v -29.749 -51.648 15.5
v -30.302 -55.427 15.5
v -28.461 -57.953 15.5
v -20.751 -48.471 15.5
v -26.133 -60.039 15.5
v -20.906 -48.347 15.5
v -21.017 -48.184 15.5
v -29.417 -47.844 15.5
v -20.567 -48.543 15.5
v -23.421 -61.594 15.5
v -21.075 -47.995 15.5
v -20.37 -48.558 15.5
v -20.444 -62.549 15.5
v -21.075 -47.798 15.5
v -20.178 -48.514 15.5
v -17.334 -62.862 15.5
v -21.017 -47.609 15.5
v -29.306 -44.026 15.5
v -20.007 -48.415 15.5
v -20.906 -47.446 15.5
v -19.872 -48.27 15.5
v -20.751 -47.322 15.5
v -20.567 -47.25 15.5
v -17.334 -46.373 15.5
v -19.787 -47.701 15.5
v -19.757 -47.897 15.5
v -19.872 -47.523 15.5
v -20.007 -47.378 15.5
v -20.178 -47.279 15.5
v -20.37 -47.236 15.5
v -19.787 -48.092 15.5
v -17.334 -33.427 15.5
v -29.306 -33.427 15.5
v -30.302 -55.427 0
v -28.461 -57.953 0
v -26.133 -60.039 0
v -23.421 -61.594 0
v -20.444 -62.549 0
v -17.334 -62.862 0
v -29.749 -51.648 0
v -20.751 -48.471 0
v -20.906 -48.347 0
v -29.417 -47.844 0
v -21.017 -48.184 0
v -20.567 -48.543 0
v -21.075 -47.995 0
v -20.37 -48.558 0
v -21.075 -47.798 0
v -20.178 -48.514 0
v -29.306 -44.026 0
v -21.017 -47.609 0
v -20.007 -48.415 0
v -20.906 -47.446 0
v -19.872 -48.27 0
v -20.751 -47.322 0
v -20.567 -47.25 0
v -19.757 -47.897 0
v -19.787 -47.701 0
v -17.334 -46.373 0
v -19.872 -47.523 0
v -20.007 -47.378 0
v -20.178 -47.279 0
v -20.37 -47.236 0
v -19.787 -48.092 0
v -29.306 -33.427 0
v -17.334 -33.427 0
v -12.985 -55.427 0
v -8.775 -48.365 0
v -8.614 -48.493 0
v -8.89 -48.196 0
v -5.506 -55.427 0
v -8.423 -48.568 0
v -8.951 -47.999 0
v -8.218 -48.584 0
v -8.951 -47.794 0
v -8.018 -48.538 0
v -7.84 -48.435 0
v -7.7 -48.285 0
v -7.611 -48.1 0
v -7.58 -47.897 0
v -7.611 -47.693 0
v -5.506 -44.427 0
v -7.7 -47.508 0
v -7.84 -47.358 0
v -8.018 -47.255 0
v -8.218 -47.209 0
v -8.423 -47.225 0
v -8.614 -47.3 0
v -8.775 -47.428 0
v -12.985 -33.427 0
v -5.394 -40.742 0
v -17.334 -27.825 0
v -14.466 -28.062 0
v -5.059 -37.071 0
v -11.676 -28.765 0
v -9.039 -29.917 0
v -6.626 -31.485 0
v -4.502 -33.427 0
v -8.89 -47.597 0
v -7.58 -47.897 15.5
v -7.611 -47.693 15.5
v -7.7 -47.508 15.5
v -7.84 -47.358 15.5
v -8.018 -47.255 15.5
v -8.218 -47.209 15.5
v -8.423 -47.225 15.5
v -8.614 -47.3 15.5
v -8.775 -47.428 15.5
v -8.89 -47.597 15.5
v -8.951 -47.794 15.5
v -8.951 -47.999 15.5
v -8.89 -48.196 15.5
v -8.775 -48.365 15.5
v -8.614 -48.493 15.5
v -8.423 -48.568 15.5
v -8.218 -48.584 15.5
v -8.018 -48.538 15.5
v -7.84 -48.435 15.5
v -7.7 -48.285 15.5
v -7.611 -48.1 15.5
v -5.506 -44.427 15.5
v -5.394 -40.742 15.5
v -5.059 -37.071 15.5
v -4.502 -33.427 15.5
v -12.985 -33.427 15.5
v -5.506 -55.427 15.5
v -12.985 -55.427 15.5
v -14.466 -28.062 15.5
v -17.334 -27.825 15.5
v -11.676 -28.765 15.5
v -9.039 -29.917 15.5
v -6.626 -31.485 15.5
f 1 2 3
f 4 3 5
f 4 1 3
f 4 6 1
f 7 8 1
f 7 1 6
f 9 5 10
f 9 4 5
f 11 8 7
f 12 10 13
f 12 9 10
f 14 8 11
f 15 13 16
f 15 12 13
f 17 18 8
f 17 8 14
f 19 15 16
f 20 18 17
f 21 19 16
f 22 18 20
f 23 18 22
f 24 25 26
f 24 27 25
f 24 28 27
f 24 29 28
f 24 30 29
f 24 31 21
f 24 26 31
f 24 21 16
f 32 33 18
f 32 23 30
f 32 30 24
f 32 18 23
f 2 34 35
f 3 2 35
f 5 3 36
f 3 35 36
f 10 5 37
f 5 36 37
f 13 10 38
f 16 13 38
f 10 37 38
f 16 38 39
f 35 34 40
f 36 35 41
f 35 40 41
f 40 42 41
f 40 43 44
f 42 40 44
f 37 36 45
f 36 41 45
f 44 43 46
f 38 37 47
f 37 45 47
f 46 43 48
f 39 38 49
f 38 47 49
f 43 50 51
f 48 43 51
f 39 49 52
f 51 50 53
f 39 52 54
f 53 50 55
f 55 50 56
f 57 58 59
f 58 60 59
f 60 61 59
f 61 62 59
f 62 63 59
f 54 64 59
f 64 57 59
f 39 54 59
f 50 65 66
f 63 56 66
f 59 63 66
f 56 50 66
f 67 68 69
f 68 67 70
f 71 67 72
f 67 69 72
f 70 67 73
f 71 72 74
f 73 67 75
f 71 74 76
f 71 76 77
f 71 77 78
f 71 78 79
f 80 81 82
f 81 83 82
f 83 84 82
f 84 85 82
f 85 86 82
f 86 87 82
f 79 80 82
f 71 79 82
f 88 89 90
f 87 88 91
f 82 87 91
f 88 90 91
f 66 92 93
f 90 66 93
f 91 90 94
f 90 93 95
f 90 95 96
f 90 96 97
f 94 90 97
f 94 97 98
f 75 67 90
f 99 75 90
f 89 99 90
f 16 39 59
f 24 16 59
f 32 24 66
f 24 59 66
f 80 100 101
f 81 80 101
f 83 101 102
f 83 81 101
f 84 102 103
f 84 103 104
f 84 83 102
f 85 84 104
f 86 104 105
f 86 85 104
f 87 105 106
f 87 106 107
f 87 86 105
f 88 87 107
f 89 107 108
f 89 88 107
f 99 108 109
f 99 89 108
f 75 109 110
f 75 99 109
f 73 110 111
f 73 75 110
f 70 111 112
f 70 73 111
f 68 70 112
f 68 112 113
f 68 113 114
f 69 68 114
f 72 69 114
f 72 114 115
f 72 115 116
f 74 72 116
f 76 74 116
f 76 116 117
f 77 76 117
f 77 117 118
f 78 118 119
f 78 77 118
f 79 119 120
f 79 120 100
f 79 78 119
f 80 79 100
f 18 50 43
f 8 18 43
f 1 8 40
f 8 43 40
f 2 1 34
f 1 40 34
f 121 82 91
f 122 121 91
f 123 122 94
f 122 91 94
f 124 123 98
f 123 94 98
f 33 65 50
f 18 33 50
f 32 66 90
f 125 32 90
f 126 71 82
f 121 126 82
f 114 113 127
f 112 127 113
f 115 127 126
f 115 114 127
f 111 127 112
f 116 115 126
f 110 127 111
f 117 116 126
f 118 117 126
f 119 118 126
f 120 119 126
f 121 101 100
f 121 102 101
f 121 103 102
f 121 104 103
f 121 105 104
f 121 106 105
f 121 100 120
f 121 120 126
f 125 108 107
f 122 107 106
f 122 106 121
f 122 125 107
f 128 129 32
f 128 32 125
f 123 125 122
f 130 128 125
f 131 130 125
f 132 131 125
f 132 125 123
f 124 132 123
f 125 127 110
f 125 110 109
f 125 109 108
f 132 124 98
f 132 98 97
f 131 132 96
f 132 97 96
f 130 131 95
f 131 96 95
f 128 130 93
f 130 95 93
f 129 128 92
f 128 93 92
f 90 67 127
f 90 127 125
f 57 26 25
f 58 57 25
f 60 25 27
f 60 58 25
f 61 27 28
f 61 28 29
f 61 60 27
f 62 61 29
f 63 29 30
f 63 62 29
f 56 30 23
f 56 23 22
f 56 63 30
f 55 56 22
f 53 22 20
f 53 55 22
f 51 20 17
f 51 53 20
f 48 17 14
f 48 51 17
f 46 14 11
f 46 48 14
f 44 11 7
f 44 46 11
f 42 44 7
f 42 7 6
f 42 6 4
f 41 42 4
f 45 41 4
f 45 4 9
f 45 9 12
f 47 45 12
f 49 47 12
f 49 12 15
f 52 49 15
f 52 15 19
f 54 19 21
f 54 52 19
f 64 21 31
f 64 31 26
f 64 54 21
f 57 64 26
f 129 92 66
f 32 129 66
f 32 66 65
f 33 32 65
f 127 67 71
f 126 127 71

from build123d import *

# Parameters (mm, degrees)
F0_W     = 8.3915624609
F0_H     = 22
F0_R     = 0.6628669698
F0_W_2   = 0.0715297889
F0_H_2   = 12.9456651346
F1_DEPTH = 15.5
F0_W_3   = 5.9789330999
F0_R_2   = 0.68921597


with BuildPart() as f1:
    # F0 (on Top) → F1 (new body)
    with BuildSketch(Plane.XY):
        Polygon((-26.8058474948, -33.4269645675), (-29.3058474948, -33.4269645675), (-29.3058474948, -44.0262116721), (-29.3058474948, -55.4269645675), (-26.8058474948, -55.4269645675), align=None)
        with Locations((-22.6100662644, -44.4269645675)):
            Rectangle(F0_W, F0_H)
        with Locations((-20.4199831933, -47.8965379298)):
            Circle(F0_R, mode=Mode.SUBTRACT)
        with BuildLine():
            Line((-29.3058474948, -55.4269645675), (-29.3058474948, -44.0262116721))
            ThreePointArc((-29.3058474948, -44.0262116721), (-29.5554500968, -49.7483224557), (-30.3023617679, -55.4269645675))
            ThreePointArc((-30.3023617679, -55.4269645675), (-24.8175859802, -60.8874080585), (-17.334317706, -62.8622256441))
            Line((-17.334317706, -62.8622256441), (-17.334317706, -55.4269645675))
            Line((-17.334317706, -55.4269645675), (-18.4142850339, -55.4269645675))
            Line((-18.4142850339, -55.4269645675), (-26.8058474948, -55.4269645675))
            Line((-26.8058474948, -55.4269645675), (-29.3058474948, -55.4269645675))
        make_face()
        Polygon((-17.4058474948, -33.4269645675), (-18.4142850339, -33.4269645675), (-18.4142850339, -55.4269645675), (-17.334317706, -55.4269645675), (-17.334317706, -46.3726297021), (-17.4058474948, -46.3726297021), align=None)
        with Locations((-17.3700826004, -39.8997971348)):
            Rectangle(F0_W_2, F0_H_2)
    extrude(amount=F1_DEPTH)


with BuildPart() as f1b:
    # F0 (on Top) → F1, piece 2 (new body)
    with BuildSketch(Plane.XY):
        with BuildLine():
            ThreePointArc((-4.5023617679, -33.4269645675), (-10.3335838979, -29.2865306602), (-17.334317706, -27.8250004287))
            Line((-17.334317706, -27.8250004287), (-17.334317706, -33.4269645675))
            Line((-17.334317706, -33.4269645675), (-12.9847805947, -33.4269645675))
            Line((-12.9847805947, -33.4269645675), (-7.0058474948, -33.4269645675))
            Line((-7.0058474948, -33.4269645675), (-5.5058474948, -33.4269645675))
            Line((-5.5058474948, -33.4269645675), (-5.5058474948, -44.4269645675))
            ThreePointArc((-5.5058474948, -44.4269645675), (-5.2544562745, -38.9041259948), (-4.5023617679, -33.4269645675))
        make_face()
        with Locations((-9.9953140448, -44.4269645675)):
            Rectangle(F0_W_3, F0_H)
        with Locations((-8.2693165168, -47.8965379298)):
            Circle(F0_R_2, mode=Mode.SUBTRACT)
        Polygon((-5.5058474948, -55.4269645675), (-5.5058474948, -44.4269645675), (-5.5058474948, -33.4269645675), (-7.0058474948, -33.4269645675), (-7.0058474948, -55.4269645675), align=None)
    extrude(amount=F1_DEPTH)


solid = Compound([f1.part, f1b.part])
